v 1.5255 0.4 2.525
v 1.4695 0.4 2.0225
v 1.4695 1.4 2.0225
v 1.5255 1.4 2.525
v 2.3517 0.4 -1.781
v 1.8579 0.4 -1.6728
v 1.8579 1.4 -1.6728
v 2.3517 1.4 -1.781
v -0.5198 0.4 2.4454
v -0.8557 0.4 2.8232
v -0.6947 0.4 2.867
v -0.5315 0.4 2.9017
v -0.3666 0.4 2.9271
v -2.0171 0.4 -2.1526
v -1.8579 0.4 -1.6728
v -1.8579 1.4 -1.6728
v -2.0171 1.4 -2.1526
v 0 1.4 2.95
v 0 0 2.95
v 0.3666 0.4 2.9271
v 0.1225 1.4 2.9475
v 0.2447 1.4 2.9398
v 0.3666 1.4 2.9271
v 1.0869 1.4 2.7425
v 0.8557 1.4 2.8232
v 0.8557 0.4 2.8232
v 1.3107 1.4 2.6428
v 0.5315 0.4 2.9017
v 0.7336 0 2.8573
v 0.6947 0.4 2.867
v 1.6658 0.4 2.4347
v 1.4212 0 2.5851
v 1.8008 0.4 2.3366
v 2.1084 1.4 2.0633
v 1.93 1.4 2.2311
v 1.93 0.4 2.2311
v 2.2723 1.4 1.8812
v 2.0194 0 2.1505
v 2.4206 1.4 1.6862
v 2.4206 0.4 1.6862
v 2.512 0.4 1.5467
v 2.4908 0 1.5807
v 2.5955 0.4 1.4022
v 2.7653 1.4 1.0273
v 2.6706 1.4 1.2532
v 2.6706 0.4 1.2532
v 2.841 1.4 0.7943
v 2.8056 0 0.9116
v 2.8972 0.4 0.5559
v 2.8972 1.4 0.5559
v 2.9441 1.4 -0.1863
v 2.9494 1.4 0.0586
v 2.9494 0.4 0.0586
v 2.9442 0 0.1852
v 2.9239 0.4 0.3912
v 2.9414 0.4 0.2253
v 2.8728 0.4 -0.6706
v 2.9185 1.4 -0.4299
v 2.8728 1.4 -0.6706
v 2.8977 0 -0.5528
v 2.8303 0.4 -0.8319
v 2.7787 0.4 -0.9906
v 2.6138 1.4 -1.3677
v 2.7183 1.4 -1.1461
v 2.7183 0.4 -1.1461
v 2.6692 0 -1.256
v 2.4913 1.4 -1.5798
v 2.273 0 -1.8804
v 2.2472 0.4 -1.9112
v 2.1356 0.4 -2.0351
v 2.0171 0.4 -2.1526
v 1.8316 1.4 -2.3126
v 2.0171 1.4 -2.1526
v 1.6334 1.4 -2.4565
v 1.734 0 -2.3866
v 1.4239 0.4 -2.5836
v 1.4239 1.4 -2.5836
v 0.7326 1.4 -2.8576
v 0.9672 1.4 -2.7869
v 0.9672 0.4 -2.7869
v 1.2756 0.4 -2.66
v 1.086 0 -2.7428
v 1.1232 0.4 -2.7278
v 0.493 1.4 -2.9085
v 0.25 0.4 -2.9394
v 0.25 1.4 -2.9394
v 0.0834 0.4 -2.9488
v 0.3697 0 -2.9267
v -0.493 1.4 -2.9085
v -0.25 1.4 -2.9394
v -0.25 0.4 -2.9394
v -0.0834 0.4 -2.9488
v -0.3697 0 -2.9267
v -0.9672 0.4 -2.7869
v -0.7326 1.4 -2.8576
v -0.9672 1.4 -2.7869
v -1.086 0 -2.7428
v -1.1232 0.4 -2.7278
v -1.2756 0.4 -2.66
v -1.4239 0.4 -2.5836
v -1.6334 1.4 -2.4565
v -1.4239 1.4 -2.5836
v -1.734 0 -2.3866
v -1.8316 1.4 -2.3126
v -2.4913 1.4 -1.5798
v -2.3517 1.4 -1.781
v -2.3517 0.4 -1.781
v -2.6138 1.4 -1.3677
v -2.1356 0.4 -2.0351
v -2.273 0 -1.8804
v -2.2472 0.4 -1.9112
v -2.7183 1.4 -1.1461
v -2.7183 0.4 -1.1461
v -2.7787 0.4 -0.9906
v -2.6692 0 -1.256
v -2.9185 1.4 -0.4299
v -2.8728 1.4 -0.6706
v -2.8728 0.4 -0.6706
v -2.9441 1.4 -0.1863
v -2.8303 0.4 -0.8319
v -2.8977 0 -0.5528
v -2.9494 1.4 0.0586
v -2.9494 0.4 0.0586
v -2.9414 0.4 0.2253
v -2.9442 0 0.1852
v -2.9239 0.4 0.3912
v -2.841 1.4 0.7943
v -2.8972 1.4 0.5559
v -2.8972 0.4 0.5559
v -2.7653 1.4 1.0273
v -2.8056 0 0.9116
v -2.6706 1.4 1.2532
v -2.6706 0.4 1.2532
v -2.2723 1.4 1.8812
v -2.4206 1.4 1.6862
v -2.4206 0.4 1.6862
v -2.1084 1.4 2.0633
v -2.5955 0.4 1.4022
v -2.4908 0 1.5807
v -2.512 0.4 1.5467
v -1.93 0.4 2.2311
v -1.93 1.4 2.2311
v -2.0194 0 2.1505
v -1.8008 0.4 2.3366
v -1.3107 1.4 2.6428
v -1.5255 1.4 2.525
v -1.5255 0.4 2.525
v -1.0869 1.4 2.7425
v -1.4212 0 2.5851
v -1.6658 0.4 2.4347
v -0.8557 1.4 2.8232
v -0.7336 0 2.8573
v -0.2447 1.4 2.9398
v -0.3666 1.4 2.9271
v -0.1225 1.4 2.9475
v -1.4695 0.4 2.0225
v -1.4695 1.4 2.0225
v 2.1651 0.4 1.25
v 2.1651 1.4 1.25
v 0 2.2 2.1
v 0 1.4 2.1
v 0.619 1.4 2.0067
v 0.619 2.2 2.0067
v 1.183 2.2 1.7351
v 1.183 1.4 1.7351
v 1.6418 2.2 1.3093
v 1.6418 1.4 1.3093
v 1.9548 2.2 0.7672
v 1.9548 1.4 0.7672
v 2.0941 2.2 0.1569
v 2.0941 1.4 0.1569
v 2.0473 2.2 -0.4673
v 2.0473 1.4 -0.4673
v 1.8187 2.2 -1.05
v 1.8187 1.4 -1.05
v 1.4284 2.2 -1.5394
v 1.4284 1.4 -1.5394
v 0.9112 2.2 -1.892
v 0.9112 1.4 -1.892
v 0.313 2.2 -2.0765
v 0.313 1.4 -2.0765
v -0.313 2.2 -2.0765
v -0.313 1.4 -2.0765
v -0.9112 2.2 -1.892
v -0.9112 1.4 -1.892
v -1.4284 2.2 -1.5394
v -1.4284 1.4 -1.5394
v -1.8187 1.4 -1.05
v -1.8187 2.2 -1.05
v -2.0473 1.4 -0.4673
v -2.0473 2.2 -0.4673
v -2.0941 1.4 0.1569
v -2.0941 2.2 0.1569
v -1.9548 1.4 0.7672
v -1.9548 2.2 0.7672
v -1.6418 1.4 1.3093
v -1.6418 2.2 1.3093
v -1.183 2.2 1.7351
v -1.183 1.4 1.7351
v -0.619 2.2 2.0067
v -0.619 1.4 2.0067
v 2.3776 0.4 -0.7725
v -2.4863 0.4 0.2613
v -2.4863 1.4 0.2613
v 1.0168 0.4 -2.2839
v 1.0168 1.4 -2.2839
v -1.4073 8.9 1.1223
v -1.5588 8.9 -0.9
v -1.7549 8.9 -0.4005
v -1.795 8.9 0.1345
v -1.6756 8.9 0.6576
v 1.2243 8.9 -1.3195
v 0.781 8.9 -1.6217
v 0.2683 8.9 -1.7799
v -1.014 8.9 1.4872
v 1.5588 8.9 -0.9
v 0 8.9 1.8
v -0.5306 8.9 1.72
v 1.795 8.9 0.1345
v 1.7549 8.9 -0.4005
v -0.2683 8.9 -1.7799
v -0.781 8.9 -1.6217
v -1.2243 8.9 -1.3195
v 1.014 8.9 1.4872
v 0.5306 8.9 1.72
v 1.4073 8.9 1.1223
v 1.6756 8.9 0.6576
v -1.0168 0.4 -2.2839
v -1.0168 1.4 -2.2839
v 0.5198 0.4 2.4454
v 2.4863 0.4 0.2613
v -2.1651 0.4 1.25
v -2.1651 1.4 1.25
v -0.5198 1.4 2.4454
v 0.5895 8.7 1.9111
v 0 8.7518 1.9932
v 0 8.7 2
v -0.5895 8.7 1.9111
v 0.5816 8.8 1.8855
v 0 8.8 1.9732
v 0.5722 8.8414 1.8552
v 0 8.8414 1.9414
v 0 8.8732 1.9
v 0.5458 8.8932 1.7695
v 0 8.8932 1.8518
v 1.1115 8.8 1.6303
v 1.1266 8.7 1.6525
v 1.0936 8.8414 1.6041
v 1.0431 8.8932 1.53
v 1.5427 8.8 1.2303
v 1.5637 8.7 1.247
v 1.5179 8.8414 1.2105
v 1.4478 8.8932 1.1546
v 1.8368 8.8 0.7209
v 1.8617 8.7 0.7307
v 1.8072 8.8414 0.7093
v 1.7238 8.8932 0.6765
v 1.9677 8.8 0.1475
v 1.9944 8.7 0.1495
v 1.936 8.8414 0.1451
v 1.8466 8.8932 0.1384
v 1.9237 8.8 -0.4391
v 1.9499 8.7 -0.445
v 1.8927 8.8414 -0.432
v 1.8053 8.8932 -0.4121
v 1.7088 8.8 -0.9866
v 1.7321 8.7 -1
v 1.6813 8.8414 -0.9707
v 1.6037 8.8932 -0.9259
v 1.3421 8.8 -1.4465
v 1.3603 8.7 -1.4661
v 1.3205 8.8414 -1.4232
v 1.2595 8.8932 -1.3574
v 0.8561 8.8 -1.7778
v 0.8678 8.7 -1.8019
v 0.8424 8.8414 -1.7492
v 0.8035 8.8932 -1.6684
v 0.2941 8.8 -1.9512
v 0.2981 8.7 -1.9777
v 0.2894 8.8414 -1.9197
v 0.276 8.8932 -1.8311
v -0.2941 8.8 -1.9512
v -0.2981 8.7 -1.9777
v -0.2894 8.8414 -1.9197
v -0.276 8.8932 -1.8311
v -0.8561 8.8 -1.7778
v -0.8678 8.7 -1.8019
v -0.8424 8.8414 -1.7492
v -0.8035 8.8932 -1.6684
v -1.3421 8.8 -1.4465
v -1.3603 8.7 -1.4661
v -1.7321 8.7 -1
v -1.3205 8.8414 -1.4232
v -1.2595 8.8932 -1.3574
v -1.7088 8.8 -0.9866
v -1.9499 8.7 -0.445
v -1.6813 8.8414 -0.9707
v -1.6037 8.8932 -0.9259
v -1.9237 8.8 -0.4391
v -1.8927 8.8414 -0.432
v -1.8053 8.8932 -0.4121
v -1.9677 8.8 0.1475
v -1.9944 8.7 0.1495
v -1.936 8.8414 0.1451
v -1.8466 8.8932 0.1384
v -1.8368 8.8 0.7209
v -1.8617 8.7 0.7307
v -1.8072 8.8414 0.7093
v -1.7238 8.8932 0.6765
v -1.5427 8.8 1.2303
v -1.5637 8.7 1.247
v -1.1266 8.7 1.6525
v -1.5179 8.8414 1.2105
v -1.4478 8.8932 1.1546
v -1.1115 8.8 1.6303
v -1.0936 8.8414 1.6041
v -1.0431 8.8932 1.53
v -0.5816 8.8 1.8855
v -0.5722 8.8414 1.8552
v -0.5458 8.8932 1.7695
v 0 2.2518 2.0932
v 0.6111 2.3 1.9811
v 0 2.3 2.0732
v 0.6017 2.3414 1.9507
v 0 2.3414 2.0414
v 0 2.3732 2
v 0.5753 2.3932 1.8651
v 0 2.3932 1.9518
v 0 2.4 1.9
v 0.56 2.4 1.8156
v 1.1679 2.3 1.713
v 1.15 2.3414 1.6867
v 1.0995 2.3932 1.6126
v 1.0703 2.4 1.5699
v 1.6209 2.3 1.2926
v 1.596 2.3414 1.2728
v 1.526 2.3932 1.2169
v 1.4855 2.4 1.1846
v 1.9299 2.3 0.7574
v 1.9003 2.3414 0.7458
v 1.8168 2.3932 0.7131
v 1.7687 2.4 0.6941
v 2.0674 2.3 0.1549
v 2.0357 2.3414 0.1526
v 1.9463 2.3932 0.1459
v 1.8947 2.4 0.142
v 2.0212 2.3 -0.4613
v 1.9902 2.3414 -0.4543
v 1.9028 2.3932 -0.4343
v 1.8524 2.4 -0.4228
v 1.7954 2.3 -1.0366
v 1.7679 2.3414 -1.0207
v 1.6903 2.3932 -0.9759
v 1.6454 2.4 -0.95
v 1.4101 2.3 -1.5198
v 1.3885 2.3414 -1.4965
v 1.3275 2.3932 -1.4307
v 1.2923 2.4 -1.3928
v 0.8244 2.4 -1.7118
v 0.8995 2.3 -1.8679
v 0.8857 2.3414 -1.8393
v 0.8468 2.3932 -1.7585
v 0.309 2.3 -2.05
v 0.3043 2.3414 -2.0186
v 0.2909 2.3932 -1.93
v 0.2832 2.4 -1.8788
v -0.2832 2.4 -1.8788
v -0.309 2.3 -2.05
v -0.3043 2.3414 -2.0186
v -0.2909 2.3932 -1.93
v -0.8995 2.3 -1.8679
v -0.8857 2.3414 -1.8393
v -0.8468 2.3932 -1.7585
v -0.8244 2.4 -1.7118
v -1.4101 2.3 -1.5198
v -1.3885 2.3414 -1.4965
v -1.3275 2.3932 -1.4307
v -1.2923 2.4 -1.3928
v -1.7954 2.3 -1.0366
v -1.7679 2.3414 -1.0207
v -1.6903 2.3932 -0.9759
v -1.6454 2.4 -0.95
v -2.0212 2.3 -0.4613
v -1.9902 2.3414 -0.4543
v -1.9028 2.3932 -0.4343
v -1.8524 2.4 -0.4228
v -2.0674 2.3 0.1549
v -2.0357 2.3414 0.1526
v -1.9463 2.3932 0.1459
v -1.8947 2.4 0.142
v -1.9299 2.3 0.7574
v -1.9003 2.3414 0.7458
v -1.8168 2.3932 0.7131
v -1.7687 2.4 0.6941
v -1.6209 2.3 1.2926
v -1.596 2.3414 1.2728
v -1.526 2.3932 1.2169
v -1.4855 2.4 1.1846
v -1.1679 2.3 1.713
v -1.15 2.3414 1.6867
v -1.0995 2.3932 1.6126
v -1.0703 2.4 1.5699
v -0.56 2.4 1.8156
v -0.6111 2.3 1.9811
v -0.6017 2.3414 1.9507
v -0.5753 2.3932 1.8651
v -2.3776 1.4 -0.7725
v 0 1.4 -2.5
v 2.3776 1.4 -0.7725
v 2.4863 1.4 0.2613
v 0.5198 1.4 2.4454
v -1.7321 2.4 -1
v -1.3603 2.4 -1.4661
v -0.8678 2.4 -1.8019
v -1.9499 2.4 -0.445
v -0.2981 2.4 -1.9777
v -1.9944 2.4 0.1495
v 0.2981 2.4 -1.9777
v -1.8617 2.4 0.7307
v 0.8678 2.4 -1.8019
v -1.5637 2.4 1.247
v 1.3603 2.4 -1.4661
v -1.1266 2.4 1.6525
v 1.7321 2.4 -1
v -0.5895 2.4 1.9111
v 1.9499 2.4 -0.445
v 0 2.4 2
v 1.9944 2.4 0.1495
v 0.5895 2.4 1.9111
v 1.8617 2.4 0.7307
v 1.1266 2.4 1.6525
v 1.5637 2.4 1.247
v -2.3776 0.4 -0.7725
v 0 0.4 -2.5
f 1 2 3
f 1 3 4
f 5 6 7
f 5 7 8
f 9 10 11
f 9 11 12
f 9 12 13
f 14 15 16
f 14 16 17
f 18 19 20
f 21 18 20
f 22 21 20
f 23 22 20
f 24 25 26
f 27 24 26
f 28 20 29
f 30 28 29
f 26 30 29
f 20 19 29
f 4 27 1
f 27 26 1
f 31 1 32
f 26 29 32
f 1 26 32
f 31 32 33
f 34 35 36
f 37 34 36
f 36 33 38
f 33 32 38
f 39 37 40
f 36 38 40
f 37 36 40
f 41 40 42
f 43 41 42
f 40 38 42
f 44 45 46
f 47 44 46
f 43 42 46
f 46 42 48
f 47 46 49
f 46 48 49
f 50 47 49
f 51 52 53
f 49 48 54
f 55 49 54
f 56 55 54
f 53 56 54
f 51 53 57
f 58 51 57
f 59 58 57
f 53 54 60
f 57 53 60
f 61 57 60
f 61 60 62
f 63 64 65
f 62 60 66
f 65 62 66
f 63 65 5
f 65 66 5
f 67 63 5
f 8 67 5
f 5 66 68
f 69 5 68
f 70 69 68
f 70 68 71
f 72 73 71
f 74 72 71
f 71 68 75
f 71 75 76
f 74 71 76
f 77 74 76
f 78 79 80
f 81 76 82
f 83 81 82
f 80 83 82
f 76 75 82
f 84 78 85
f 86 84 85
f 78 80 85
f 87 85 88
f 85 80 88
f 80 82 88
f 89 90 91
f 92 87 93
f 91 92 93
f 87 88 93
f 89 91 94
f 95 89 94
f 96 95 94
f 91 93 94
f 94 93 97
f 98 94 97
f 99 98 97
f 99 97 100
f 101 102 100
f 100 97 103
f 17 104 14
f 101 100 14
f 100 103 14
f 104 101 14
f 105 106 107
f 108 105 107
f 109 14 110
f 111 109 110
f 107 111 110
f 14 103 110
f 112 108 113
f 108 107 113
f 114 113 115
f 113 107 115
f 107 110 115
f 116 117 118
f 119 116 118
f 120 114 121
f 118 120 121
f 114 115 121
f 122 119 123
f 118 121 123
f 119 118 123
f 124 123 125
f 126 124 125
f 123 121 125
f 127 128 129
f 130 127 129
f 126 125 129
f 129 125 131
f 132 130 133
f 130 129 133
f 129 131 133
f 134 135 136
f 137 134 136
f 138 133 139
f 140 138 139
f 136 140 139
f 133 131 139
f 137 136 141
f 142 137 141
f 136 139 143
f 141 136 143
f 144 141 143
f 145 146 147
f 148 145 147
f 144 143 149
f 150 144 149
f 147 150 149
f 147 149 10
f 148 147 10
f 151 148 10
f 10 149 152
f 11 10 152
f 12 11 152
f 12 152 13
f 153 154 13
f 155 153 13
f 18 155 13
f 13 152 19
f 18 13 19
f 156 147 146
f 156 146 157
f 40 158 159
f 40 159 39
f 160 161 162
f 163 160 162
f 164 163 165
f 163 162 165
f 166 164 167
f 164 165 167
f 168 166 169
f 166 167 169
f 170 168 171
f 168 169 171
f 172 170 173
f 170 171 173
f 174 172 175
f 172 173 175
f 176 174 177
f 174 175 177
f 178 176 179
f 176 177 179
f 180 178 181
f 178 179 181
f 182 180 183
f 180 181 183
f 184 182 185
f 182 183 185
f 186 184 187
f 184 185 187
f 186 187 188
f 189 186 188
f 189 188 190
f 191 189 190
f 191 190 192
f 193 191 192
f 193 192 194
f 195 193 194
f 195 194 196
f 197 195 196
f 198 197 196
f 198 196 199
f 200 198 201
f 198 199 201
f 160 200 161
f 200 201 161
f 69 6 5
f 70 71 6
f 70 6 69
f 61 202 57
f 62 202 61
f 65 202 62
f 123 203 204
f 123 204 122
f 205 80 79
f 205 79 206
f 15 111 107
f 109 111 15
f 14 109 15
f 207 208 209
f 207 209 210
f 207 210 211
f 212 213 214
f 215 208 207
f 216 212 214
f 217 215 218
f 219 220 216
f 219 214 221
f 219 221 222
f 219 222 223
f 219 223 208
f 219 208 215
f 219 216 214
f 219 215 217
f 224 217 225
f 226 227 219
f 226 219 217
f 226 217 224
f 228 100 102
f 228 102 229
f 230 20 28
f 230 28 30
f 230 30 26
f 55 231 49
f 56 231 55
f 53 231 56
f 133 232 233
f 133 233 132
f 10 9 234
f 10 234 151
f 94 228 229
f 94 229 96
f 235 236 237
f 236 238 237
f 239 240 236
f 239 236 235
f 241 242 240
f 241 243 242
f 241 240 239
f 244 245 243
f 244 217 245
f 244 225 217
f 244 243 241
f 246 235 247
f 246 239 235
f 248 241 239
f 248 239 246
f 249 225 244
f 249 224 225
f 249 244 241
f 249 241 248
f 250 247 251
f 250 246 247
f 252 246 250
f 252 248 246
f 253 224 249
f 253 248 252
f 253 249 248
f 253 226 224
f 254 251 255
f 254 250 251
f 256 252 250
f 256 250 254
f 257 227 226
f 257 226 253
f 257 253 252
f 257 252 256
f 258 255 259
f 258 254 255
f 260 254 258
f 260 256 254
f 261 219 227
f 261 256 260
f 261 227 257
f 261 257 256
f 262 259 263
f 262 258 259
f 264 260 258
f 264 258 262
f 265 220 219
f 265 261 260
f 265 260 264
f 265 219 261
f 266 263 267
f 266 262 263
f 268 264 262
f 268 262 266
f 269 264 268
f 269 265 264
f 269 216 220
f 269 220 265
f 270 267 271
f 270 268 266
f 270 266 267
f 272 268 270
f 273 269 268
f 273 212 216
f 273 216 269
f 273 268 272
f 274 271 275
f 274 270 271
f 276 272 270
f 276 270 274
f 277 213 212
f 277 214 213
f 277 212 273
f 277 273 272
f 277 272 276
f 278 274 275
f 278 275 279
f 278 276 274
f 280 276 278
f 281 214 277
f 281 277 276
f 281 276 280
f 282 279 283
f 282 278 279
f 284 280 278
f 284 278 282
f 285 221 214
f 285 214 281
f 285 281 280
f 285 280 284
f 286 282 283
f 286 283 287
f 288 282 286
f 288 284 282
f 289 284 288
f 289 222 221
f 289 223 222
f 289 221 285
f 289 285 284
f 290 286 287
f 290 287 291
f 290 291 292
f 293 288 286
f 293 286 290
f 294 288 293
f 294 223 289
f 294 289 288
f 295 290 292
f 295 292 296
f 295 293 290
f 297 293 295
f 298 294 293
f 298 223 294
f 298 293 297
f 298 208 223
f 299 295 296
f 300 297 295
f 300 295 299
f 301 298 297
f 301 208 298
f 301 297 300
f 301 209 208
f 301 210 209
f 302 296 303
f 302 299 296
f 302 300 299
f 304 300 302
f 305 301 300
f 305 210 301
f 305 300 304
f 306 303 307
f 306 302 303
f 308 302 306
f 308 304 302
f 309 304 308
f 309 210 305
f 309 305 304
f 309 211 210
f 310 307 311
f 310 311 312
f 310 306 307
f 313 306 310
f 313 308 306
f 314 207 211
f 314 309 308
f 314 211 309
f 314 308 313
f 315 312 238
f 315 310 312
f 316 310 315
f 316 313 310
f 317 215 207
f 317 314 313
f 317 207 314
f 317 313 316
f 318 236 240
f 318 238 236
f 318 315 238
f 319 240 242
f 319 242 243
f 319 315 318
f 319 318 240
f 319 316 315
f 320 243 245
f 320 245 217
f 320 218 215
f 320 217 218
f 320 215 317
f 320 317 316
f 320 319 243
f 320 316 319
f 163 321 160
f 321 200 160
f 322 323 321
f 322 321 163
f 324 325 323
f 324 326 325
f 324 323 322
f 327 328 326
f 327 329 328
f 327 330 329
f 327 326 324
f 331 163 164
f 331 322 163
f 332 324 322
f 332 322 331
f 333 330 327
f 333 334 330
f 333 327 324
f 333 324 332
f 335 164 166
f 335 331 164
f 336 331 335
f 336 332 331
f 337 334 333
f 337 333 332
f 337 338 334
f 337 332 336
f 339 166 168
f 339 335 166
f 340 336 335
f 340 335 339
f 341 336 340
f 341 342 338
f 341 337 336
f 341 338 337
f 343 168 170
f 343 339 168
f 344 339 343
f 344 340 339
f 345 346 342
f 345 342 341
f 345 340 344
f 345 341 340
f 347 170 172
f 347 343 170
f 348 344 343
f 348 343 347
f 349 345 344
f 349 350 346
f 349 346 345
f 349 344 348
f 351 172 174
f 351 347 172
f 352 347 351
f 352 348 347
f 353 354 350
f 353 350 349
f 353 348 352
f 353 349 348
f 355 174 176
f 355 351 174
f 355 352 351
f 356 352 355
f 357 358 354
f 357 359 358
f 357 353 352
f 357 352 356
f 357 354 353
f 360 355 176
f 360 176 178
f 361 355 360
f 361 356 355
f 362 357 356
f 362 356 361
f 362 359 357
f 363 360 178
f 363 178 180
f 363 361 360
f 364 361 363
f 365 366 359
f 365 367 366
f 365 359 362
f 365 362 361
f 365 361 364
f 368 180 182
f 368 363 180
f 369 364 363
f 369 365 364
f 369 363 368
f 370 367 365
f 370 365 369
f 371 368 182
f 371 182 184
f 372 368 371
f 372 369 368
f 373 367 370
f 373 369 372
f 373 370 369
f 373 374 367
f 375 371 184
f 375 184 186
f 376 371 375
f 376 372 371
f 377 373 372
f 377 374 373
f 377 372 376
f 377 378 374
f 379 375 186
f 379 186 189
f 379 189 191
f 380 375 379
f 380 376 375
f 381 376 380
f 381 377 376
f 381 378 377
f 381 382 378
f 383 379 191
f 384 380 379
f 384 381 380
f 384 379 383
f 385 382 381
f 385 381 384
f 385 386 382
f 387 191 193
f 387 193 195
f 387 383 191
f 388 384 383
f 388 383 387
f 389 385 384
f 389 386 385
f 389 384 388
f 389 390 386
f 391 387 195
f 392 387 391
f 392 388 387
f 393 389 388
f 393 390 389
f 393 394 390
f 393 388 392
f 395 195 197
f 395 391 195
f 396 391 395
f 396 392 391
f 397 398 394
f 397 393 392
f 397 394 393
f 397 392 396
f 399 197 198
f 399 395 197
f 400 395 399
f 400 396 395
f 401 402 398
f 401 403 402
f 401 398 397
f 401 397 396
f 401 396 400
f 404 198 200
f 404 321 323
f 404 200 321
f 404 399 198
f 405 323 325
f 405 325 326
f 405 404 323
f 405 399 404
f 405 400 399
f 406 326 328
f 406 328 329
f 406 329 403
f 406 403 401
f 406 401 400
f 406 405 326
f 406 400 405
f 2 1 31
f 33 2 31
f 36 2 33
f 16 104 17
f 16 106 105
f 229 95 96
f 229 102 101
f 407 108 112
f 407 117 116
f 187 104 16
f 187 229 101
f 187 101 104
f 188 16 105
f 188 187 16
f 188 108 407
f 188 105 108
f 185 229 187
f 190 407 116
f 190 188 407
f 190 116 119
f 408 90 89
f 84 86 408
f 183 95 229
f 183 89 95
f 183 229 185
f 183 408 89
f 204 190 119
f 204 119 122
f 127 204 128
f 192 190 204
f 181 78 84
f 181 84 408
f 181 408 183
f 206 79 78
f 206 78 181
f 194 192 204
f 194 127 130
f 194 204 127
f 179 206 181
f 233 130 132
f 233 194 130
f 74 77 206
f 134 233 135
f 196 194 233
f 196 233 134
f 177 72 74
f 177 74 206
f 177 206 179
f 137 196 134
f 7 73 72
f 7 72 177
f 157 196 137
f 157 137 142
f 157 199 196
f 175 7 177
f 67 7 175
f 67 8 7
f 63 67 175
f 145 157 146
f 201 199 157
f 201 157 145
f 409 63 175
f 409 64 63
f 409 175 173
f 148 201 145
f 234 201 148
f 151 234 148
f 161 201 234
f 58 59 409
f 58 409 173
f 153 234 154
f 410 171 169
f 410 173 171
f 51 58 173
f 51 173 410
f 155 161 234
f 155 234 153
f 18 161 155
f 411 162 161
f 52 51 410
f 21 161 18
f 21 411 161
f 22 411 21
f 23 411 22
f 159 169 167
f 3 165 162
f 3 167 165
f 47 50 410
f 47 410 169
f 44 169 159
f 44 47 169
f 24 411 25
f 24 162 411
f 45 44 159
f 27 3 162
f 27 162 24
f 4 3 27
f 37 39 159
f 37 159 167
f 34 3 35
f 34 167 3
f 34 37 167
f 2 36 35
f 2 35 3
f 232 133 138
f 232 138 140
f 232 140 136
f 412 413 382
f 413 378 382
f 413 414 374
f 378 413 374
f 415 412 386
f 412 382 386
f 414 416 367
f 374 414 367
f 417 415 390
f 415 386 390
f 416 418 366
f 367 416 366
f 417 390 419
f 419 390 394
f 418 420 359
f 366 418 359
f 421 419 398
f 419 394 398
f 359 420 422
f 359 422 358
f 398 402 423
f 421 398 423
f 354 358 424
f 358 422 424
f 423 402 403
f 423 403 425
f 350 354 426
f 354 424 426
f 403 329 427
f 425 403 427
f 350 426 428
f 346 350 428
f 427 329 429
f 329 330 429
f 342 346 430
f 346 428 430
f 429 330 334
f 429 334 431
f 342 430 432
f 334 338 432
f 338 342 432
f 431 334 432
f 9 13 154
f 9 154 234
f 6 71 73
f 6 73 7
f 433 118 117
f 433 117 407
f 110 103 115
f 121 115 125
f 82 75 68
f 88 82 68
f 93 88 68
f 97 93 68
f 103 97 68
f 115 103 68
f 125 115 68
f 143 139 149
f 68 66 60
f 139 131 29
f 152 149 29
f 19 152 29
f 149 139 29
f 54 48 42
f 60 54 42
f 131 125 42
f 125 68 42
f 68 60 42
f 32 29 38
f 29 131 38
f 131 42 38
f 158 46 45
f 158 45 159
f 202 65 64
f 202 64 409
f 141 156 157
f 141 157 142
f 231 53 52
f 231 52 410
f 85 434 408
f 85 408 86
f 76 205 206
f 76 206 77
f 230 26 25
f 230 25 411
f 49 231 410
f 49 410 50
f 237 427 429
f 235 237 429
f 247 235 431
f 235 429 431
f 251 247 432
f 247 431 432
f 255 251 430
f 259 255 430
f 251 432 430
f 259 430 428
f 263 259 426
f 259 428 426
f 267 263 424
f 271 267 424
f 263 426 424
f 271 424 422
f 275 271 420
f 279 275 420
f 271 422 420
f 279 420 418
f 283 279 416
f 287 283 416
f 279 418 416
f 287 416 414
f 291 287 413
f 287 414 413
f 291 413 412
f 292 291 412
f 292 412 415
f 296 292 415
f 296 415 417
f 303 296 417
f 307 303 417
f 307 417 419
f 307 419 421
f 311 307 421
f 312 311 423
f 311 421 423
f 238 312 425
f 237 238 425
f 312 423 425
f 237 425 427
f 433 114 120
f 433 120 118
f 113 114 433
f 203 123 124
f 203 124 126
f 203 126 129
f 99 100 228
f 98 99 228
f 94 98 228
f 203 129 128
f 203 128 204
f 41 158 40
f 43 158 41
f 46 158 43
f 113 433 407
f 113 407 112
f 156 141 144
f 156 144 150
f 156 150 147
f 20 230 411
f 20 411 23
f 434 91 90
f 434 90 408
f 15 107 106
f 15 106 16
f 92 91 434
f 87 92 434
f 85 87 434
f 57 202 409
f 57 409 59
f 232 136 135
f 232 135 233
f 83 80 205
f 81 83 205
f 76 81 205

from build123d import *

# Parameters (mm, degrees)
ESBO_O1_R                = 2.95
RESSALTO_EXTRUS_O1_DEPTH = 1.4
CORTE_EXTRUS_O1_START    = -1
CORTE_EXTRUS_O1_DEPTH    = 1
ESBO_O3_R                = 2.1
RESSALTO_EXTRUS_O2_DEPTH = 1
FILETE3_R                = 0.2
ESBO_O4_R                = 2
RESSALTO_EXTRUS_O3_DEPTH = 6.5
FILETE4_R                = 0.2


with BuildPart() as part:
    # Esboço1 → Ressalto-extrusão1 (new body)
    with BuildSketch(Plane(origin=(0, 0, 0), x_dir=(1, 0, 0), z_dir=(0, 1, 0))):
        with Locations(Location((0, 0, 0), (0, 0, 270))):
            Circle(ESBO_O1_R)
    extrude(amount=RESSALTO_EXTRUS_O1_DEPTH)

    # Esboço2 → Corte-extrusão1 (cut)
    with BuildSketch(Plane(origin=(0, 1.4, 0), x_dir=(1, 0, 0), z_dir=(0, 1, 0)).offset(CORTE_EXTRUS_O1_START)):
        with BuildLine():
            Line((-0.25, 2.939387691), (0, 2.5))
            Line((0, 2.5), (0.25, 2.939387691))
            ThreePointArc((0.25, 2.939387691), (0, 2.95), (-0.25, 2.939387691))
        make_face()
        with BuildLine():
            Line((1.016841608, 2.283863644), (1.423943047, 2.583580113))
            ThreePointArc((1.423943047, 2.583580113), (1.199873097, 2.6949591), (0.967170318, 2.786948434))
            Line((0.967170318, 2.786948434), (1.016841608, 2.283863644))
        make_face()
        with BuildLine():
            Line((1.857862064, 1.672826516), (2.351673404, 1.781048062))
            ThreePointArc((2.351673404, 1.781048062), (2.192277235, 1.973935289), (2.017108101, 2.152620475))
            Line((2.017108101, 2.152620475), (1.857862064, 1.672826516))
        make_face()
        with BuildLine():
            Line((2.377641291, 0.772542486), (2.872778066, 0.670556621))
            ThreePointArc((2.872778066, 0.670556621), (2.805616723, 0.911600133), (2.718269569, 1.146084879))
            Line((2.718269569, 1.146084879), (2.377641291, 0.772542486))
        make_face()
        with BuildLine():
            Line((2.486304738, -0.261321158), (2.897153302, -0.555880152))
            ThreePointArc((2.897153302, -0.555880152), (2.933839591, -0.308358967), (2.949417534, -0.058619204))
            Line((2.949417534, -0.058619204), (2.486304738, -0.261321158))
        make_face()
        with BuildLine():
            Line((2.165063509, -1.25), (2.420584412, -1.686200197))
            ThreePointArc((2.420584412, -1.686200197), (2.554774941, -1.475), (2.670584412, -1.253187495))
            Line((2.670584412, -1.253187495), (2.165063509, -1.25))
        make_face()
        with BuildLine():
            Line((1.469463131, -2.022542486), (1.525474487, -2.524960908))
            ThreePointArc((1.525474487, -2.524960908), (1.733966494, -2.386600133), (1.929982984, -2.231068282))
            Line((1.929982984, -2.231068282), (1.469463131, -2.022542486))
        make_face()
        with BuildLine():
            Line((0.519779227, -2.445369002), (0.366596165, -2.927132941))
            ThreePointArc((0.366596165, -2.927132941), (0.613339488, -2.885535422), (0.855669965, -2.823177095))
            Line((0.855669965, -2.823177095), (0.519779227, -2.445369002))
        make_face()
        with BuildLine():
            Line((-0.519779227, -2.445369002), (-0.855669965, -2.823177095))
            ThreePointArc((-0.855669965, -2.823177095), (-0.613339488, -2.885535422), (-0.366596165, -2.927132941))
            Line((-0.366596165, -2.927132941), (-0.519779227, -2.445369002))
        make_face()
        with BuildLine():
            Line((-1.469463131, -2.022542486), (-1.929982984, -2.231068282))
            ThreePointArc((-1.929982984, -2.231068282), (-1.733966494, -2.386600133), (-1.525474487, -2.524960908))
            Line((-1.525474487, -2.524960908), (-1.469463131, -2.022542486))
        make_face()
        with BuildLine():
            Line((-2.165063509, -1.25), (-2.670584412, -1.253187495))
            ThreePointArc((-2.670584412, -1.253187495), (-2.554774941, -1.475), (-2.420584412, -1.686200197))
            Line((-2.420584412, -1.686200197), (-2.165063509, -1.25))
        make_face()
        with BuildLine():
            Line((-2.486304738, -0.261321158), (-2.949417534, -0.058619204))
            ThreePointArc((-2.949417534, -0.058619204), (-2.933839591, -0.308358967), (-2.897153302, -0.555880152))
            Line((-2.897153302, -0.555880152), (-2.486304738, -0.261321158))
        make_face()
        with BuildLine():
            Line((-2.377641291, 0.772542486), (-2.718269569, 1.146084879))
            ThreePointArc((-2.718269569, 1.146084879), (-2.805616723, 0.911600133), (-2.872778066, 0.670556621))
            Line((-2.872778066, 0.670556621), (-2.377641291, 0.772542486))
        make_face()
        with BuildLine():
            Line((-1.857862064, 1.672826516), (-2.017108101, 2.152620475))
            ThreePointArc((-2.017108101, 2.152620475), (-2.192277235, 1.973935289), (-2.351673404, 1.781048062))
            Line((-2.351673404, 1.781048062), (-1.857862064, 1.672826516))
        make_face()
        with BuildLine():
            Line((-1.016841608, 2.283863644), (-0.967170318, 2.786948434))
            ThreePointArc((-0.967170318, 2.786948434), (-1.199873097, 2.6949591), (-1.423943047, 2.583580113))
            Line((-1.423943047, 2.583580113), (-1.016841608, 2.283863644))
        make_face()
    extrude(amount=CORTE_EXTRUS_O1_DEPTH, mode=Mode.SUBTRACT)

    # Esboço3 → Ressalto-extrusão2 (add)
    with BuildSketch(Plane(origin=(0, 1.4, 0), x_dir=(1, 0, 0), z_dir=(0, 1, 0))):
        with Locations(Location((0, 0, 0), (0, 0, 270))):
            Circle(ESBO_O3_R)
    extrude(amount=RESSALTO_EXTRUS_O2_DEPTH)

    # Filete3
    filete3_edges = [part.edges().sort_by_distance(p)[0] for p in [
        (0, 2.4, -2.1),
    ]]
    fillet(filete3_edges, radius=FILETE3_R)

    # Esboço4 → Ressalto-extrusão3 (add)
    with BuildSketch(Plane(origin=(0, 2.4, 0), x_dir=(1, 0, 0), z_dir=(0, 1, 0))):
        with Locations(Location((0, 0, 0), (0, 0, 270))):
            Circle(ESBO_O4_R)
    extrude(amount=RESSALTO_EXTRUS_O3_DEPTH)

    # Filete4
    filete4_edges = [part.edges().sort_by_distance(p)[0] for p in [
        (0, 8.9, -2),
    ]]
    fillet(filete4_edges, radius=FILETE4_R)


solid = part.part
